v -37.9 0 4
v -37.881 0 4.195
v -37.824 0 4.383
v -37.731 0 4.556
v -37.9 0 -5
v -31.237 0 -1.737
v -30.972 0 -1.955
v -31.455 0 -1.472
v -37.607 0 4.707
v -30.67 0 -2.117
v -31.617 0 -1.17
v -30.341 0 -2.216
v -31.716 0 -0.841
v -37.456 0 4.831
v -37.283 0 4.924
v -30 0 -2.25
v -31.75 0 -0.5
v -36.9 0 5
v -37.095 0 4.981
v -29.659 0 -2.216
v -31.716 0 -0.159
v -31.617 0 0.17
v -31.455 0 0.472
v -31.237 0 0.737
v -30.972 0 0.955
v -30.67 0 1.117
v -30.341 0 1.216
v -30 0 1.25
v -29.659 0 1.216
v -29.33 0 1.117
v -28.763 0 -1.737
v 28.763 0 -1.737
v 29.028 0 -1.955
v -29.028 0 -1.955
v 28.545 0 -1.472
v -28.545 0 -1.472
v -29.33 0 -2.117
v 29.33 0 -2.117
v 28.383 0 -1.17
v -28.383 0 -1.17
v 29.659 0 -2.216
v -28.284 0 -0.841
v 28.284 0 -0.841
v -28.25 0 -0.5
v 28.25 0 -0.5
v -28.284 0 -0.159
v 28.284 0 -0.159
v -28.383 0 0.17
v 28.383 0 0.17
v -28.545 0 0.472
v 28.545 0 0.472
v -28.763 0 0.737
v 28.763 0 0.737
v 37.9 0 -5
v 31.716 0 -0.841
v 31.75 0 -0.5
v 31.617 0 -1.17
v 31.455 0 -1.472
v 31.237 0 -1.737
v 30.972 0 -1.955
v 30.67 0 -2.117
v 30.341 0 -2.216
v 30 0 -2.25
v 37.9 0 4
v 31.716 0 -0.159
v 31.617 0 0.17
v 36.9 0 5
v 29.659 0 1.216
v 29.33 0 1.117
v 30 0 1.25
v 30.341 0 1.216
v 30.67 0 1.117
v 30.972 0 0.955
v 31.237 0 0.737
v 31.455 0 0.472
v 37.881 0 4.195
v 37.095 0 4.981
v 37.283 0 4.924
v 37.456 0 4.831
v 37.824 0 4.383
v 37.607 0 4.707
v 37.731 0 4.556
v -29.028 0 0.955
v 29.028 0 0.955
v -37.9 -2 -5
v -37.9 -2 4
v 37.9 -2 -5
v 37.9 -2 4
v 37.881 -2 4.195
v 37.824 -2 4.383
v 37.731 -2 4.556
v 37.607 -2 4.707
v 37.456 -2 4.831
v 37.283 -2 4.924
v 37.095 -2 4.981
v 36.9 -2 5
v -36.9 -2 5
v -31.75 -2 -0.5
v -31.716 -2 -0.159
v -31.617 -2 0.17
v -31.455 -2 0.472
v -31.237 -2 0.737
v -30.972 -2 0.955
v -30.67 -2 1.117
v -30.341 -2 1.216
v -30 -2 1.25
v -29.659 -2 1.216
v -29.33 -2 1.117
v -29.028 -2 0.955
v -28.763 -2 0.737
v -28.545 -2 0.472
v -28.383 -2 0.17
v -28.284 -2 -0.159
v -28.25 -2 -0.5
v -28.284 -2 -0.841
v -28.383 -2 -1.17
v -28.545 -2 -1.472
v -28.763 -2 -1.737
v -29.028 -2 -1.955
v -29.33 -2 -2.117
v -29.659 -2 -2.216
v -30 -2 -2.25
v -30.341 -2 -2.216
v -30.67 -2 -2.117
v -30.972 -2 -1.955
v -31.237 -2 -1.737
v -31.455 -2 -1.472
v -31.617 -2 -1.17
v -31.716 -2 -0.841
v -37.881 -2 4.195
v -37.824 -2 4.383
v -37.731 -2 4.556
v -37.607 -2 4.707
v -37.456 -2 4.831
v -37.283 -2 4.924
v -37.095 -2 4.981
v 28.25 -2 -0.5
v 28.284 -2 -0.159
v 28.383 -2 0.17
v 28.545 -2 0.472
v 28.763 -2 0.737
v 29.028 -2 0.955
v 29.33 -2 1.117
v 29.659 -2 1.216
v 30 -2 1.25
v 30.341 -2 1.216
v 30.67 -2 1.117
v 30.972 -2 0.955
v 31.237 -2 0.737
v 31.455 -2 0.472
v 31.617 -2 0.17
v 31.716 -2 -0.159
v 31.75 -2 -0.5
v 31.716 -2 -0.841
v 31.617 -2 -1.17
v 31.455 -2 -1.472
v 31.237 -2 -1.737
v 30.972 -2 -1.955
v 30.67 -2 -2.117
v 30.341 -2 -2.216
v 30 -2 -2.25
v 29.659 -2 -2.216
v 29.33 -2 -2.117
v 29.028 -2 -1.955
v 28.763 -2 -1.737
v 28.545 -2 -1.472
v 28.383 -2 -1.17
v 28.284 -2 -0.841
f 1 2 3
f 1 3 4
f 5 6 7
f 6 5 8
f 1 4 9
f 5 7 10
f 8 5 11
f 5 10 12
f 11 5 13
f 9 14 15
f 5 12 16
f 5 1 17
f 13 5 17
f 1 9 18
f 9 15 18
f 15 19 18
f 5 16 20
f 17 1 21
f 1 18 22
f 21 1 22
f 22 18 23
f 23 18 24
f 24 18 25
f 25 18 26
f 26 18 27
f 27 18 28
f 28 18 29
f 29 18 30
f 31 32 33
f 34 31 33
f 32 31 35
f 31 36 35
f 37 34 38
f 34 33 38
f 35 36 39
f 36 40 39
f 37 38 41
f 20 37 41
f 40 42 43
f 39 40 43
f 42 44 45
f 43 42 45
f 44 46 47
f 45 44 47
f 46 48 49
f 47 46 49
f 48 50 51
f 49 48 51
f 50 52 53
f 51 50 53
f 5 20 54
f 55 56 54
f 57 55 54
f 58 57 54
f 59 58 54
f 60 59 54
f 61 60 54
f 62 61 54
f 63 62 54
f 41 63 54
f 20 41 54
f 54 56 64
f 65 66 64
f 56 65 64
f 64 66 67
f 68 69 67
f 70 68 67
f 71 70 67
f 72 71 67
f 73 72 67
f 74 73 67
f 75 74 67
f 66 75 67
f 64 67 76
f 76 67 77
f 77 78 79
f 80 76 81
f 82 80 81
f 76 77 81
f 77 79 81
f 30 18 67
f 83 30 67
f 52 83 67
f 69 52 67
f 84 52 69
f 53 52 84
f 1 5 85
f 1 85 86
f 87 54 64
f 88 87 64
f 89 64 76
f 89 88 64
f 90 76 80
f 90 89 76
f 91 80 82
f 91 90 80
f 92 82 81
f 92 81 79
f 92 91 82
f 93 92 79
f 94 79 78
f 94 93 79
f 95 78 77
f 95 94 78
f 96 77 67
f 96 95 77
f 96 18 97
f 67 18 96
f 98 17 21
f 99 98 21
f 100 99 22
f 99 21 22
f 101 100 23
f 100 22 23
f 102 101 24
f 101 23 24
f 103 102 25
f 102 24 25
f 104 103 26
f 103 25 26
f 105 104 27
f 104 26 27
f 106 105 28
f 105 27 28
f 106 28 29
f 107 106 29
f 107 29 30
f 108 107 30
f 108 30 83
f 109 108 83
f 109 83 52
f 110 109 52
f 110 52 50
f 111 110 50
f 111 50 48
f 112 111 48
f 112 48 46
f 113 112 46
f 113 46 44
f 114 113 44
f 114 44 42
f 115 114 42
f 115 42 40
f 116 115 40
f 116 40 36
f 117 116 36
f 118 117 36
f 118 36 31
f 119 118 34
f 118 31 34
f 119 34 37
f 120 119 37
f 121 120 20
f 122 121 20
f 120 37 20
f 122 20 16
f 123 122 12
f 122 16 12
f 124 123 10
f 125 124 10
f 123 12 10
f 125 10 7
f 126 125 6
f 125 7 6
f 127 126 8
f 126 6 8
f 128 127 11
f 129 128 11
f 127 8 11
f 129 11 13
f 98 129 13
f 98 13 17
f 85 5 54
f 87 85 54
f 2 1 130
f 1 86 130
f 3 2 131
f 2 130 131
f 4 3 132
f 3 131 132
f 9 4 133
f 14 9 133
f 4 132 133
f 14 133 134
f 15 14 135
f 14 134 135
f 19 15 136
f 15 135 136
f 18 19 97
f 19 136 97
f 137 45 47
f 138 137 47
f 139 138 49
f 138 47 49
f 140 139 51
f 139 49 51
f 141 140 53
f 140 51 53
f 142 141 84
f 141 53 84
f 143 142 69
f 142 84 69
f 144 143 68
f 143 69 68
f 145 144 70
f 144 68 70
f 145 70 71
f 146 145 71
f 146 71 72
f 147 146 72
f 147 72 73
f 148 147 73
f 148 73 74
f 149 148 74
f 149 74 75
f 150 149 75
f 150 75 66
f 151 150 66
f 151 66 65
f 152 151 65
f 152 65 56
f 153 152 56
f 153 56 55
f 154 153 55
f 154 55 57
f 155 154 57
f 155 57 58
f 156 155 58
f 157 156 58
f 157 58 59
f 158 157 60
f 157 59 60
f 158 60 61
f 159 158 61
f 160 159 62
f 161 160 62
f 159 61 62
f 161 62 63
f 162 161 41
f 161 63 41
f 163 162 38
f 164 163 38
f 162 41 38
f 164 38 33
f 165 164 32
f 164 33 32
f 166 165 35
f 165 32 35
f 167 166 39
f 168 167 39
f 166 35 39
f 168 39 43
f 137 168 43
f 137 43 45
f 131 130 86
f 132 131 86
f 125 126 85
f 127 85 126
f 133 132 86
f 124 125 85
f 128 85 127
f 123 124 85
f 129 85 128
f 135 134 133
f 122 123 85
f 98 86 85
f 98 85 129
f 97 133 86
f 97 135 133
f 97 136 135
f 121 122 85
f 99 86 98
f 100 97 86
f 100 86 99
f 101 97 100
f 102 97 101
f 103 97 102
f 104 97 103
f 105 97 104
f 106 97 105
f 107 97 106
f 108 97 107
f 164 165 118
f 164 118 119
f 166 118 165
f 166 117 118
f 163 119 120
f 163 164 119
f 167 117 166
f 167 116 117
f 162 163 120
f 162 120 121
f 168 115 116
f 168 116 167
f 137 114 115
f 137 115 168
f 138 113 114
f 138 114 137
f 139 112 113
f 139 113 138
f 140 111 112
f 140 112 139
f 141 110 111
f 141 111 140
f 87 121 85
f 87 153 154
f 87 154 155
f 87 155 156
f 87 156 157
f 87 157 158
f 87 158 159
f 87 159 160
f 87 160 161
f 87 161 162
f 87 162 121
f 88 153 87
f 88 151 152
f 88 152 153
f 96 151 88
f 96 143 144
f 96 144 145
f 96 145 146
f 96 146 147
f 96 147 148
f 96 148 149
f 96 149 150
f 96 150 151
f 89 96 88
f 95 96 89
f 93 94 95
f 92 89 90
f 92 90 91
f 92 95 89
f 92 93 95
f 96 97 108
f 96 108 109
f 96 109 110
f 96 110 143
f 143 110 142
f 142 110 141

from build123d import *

# Parameters (mm, degrees)
F0_W     = 75.8
F0_H     = 10
F1_DEPTH = 2
F2_R     = 1
F4_D     = 3.5


with BuildPart() as f1:
    # F0 (on Front) → F1 (new body)
    with BuildSketch(Plane.XZ):
        Rectangle(F0_W, F0_H)
    extrude(amount=F1_DEPTH)

    # F2
    f2_edges = [f1.edges().sort_by_distance(p)[0] for p in [
        (-37.9, -1, 5),
        (37.9, -1, 5),
    ]]
    fillet(f2_edges, radius=F2_R)

    # F4 (through all)
    with Locations(Plane.XZ.offset(2)):
        with Locations((30, -0.5), (-30, -0.5)):
            Hole(F4_D / 2)


solid = f1.part
